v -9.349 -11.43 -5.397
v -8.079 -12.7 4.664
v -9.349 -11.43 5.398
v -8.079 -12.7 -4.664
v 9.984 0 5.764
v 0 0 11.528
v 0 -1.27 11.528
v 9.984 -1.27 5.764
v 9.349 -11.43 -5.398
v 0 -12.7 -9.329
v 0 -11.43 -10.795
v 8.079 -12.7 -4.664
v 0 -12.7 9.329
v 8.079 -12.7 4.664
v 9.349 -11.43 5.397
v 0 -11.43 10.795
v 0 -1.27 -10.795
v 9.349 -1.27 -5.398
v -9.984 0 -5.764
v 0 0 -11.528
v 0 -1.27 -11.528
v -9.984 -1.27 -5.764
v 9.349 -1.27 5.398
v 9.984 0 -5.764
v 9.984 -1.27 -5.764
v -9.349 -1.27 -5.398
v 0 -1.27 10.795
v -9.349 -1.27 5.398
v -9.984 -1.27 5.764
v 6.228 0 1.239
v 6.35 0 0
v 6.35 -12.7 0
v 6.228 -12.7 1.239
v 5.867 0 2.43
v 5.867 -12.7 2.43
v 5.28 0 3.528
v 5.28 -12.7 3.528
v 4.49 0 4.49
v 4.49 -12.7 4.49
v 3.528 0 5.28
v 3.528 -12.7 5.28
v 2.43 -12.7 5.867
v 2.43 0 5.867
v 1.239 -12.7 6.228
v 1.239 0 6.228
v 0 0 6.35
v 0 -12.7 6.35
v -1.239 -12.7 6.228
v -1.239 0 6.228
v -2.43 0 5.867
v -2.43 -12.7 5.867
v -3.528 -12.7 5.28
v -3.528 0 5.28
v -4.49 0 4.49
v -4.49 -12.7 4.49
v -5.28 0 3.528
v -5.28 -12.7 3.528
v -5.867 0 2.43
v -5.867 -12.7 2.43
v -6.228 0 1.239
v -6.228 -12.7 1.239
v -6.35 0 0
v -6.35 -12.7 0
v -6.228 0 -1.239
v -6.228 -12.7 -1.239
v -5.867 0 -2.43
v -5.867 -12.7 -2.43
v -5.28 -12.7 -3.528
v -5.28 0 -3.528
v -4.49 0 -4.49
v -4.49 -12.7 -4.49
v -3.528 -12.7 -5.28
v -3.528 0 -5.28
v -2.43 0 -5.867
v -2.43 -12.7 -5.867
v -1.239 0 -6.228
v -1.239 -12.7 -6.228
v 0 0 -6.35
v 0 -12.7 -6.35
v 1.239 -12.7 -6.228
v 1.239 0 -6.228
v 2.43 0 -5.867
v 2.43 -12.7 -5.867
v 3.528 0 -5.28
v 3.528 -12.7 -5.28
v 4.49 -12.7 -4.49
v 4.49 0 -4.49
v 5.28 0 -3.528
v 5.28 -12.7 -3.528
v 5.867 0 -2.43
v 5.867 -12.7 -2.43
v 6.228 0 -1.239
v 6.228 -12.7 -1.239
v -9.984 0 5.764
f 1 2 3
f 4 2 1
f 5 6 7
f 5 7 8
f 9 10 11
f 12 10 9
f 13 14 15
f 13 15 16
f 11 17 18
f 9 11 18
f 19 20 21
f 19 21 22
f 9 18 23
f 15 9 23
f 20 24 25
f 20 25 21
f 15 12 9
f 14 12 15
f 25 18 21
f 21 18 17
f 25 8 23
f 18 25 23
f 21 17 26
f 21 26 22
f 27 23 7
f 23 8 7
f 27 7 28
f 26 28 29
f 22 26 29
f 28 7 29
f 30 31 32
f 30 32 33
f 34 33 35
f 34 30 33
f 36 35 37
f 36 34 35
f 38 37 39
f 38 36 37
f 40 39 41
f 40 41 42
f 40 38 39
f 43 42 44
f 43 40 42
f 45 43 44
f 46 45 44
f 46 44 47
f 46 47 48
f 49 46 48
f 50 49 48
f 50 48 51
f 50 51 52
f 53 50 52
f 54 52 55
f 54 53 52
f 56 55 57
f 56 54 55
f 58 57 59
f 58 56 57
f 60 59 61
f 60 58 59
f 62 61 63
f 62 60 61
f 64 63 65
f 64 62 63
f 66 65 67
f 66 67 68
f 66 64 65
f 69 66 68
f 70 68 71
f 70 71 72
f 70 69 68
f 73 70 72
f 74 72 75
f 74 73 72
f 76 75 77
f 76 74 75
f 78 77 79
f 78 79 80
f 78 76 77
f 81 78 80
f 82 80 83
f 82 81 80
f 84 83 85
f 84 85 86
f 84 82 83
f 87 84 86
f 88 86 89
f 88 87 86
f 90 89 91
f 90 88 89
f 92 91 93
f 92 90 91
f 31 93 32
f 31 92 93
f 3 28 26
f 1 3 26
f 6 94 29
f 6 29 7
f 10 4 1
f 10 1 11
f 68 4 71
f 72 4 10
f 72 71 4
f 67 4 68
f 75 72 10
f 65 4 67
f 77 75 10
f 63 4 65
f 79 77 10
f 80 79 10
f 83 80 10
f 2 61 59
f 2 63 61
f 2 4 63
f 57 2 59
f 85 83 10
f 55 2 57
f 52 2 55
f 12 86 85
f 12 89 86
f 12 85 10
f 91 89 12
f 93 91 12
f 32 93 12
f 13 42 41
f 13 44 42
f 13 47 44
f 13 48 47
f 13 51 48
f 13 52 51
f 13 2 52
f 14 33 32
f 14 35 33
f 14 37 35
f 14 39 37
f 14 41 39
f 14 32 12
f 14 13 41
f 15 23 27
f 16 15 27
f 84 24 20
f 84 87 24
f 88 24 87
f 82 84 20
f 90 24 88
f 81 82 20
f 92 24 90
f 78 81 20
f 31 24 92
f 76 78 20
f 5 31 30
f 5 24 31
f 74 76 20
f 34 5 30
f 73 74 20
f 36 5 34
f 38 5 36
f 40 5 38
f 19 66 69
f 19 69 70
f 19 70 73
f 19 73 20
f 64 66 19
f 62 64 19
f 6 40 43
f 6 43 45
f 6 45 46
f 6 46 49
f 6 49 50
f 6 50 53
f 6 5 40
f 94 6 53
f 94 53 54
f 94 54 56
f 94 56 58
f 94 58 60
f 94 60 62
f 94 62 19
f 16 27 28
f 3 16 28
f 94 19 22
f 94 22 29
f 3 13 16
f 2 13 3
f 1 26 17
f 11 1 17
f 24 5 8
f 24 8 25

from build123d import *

# Parameters (mm, degrees)
F0_R     = 6.35
F1_DEPTH = 12.7
F2_SIZE  = 1.27
F4_DEPTH = 1.27


with BuildPart() as f1:
    # F0 (on Front) → F1 (new body)
    with BuildSketch(Plane.XZ):
        Polygon((9.348744, 5.3975), (0, 10.795), (-9.348744, 5.3975), (-9.348744, -5.3975), (0, -10.795), (9.348744, -5.3975), align=None)
        Circle(F0_R, mode=Mode.SUBTRACT)
    extrude(amount=F1_DEPTH)

    # F2
    f2_edges = [f1.edges().sort_by_distance(p)[0] for p in [
        (4.674372, -12.7, 8.09625),
        (9.348744, -12.7, 0),
        (4.674372, -12.7, -8.09625),
        (-4.674372, -12.7, -8.09625),
        (-9.348744, -12.7, 0),
        (-4.674372, -12.7, 8.09625),
    ]]
    chamfer(f2_edges, length=F2_SIZE)

    # F3 (on face) → F4 (join)
    with BuildSketch(Plane(origin=(0, 0, 0), x_dir=(-1, 0, 0), z_dir=(0, 1, 0))):
        Polygon((9.983744, -5.764117), (9.983744, 5.764117), (0, 11.528235), (-9.983744, 5.764117), (-9.983744, -5.764117), (0, -11.528235), align=None)
        Polygon((-9.348744, -5.3975), (-9.348744, 5.3975), (0, 10.795), (9.348744, 5.3975), (9.348744, -5.3975), (0, -10.795), align=None, mode=Mode.SUBTRACT)
    extrude(amount=-F4_DEPTH)


solid = f1.part
